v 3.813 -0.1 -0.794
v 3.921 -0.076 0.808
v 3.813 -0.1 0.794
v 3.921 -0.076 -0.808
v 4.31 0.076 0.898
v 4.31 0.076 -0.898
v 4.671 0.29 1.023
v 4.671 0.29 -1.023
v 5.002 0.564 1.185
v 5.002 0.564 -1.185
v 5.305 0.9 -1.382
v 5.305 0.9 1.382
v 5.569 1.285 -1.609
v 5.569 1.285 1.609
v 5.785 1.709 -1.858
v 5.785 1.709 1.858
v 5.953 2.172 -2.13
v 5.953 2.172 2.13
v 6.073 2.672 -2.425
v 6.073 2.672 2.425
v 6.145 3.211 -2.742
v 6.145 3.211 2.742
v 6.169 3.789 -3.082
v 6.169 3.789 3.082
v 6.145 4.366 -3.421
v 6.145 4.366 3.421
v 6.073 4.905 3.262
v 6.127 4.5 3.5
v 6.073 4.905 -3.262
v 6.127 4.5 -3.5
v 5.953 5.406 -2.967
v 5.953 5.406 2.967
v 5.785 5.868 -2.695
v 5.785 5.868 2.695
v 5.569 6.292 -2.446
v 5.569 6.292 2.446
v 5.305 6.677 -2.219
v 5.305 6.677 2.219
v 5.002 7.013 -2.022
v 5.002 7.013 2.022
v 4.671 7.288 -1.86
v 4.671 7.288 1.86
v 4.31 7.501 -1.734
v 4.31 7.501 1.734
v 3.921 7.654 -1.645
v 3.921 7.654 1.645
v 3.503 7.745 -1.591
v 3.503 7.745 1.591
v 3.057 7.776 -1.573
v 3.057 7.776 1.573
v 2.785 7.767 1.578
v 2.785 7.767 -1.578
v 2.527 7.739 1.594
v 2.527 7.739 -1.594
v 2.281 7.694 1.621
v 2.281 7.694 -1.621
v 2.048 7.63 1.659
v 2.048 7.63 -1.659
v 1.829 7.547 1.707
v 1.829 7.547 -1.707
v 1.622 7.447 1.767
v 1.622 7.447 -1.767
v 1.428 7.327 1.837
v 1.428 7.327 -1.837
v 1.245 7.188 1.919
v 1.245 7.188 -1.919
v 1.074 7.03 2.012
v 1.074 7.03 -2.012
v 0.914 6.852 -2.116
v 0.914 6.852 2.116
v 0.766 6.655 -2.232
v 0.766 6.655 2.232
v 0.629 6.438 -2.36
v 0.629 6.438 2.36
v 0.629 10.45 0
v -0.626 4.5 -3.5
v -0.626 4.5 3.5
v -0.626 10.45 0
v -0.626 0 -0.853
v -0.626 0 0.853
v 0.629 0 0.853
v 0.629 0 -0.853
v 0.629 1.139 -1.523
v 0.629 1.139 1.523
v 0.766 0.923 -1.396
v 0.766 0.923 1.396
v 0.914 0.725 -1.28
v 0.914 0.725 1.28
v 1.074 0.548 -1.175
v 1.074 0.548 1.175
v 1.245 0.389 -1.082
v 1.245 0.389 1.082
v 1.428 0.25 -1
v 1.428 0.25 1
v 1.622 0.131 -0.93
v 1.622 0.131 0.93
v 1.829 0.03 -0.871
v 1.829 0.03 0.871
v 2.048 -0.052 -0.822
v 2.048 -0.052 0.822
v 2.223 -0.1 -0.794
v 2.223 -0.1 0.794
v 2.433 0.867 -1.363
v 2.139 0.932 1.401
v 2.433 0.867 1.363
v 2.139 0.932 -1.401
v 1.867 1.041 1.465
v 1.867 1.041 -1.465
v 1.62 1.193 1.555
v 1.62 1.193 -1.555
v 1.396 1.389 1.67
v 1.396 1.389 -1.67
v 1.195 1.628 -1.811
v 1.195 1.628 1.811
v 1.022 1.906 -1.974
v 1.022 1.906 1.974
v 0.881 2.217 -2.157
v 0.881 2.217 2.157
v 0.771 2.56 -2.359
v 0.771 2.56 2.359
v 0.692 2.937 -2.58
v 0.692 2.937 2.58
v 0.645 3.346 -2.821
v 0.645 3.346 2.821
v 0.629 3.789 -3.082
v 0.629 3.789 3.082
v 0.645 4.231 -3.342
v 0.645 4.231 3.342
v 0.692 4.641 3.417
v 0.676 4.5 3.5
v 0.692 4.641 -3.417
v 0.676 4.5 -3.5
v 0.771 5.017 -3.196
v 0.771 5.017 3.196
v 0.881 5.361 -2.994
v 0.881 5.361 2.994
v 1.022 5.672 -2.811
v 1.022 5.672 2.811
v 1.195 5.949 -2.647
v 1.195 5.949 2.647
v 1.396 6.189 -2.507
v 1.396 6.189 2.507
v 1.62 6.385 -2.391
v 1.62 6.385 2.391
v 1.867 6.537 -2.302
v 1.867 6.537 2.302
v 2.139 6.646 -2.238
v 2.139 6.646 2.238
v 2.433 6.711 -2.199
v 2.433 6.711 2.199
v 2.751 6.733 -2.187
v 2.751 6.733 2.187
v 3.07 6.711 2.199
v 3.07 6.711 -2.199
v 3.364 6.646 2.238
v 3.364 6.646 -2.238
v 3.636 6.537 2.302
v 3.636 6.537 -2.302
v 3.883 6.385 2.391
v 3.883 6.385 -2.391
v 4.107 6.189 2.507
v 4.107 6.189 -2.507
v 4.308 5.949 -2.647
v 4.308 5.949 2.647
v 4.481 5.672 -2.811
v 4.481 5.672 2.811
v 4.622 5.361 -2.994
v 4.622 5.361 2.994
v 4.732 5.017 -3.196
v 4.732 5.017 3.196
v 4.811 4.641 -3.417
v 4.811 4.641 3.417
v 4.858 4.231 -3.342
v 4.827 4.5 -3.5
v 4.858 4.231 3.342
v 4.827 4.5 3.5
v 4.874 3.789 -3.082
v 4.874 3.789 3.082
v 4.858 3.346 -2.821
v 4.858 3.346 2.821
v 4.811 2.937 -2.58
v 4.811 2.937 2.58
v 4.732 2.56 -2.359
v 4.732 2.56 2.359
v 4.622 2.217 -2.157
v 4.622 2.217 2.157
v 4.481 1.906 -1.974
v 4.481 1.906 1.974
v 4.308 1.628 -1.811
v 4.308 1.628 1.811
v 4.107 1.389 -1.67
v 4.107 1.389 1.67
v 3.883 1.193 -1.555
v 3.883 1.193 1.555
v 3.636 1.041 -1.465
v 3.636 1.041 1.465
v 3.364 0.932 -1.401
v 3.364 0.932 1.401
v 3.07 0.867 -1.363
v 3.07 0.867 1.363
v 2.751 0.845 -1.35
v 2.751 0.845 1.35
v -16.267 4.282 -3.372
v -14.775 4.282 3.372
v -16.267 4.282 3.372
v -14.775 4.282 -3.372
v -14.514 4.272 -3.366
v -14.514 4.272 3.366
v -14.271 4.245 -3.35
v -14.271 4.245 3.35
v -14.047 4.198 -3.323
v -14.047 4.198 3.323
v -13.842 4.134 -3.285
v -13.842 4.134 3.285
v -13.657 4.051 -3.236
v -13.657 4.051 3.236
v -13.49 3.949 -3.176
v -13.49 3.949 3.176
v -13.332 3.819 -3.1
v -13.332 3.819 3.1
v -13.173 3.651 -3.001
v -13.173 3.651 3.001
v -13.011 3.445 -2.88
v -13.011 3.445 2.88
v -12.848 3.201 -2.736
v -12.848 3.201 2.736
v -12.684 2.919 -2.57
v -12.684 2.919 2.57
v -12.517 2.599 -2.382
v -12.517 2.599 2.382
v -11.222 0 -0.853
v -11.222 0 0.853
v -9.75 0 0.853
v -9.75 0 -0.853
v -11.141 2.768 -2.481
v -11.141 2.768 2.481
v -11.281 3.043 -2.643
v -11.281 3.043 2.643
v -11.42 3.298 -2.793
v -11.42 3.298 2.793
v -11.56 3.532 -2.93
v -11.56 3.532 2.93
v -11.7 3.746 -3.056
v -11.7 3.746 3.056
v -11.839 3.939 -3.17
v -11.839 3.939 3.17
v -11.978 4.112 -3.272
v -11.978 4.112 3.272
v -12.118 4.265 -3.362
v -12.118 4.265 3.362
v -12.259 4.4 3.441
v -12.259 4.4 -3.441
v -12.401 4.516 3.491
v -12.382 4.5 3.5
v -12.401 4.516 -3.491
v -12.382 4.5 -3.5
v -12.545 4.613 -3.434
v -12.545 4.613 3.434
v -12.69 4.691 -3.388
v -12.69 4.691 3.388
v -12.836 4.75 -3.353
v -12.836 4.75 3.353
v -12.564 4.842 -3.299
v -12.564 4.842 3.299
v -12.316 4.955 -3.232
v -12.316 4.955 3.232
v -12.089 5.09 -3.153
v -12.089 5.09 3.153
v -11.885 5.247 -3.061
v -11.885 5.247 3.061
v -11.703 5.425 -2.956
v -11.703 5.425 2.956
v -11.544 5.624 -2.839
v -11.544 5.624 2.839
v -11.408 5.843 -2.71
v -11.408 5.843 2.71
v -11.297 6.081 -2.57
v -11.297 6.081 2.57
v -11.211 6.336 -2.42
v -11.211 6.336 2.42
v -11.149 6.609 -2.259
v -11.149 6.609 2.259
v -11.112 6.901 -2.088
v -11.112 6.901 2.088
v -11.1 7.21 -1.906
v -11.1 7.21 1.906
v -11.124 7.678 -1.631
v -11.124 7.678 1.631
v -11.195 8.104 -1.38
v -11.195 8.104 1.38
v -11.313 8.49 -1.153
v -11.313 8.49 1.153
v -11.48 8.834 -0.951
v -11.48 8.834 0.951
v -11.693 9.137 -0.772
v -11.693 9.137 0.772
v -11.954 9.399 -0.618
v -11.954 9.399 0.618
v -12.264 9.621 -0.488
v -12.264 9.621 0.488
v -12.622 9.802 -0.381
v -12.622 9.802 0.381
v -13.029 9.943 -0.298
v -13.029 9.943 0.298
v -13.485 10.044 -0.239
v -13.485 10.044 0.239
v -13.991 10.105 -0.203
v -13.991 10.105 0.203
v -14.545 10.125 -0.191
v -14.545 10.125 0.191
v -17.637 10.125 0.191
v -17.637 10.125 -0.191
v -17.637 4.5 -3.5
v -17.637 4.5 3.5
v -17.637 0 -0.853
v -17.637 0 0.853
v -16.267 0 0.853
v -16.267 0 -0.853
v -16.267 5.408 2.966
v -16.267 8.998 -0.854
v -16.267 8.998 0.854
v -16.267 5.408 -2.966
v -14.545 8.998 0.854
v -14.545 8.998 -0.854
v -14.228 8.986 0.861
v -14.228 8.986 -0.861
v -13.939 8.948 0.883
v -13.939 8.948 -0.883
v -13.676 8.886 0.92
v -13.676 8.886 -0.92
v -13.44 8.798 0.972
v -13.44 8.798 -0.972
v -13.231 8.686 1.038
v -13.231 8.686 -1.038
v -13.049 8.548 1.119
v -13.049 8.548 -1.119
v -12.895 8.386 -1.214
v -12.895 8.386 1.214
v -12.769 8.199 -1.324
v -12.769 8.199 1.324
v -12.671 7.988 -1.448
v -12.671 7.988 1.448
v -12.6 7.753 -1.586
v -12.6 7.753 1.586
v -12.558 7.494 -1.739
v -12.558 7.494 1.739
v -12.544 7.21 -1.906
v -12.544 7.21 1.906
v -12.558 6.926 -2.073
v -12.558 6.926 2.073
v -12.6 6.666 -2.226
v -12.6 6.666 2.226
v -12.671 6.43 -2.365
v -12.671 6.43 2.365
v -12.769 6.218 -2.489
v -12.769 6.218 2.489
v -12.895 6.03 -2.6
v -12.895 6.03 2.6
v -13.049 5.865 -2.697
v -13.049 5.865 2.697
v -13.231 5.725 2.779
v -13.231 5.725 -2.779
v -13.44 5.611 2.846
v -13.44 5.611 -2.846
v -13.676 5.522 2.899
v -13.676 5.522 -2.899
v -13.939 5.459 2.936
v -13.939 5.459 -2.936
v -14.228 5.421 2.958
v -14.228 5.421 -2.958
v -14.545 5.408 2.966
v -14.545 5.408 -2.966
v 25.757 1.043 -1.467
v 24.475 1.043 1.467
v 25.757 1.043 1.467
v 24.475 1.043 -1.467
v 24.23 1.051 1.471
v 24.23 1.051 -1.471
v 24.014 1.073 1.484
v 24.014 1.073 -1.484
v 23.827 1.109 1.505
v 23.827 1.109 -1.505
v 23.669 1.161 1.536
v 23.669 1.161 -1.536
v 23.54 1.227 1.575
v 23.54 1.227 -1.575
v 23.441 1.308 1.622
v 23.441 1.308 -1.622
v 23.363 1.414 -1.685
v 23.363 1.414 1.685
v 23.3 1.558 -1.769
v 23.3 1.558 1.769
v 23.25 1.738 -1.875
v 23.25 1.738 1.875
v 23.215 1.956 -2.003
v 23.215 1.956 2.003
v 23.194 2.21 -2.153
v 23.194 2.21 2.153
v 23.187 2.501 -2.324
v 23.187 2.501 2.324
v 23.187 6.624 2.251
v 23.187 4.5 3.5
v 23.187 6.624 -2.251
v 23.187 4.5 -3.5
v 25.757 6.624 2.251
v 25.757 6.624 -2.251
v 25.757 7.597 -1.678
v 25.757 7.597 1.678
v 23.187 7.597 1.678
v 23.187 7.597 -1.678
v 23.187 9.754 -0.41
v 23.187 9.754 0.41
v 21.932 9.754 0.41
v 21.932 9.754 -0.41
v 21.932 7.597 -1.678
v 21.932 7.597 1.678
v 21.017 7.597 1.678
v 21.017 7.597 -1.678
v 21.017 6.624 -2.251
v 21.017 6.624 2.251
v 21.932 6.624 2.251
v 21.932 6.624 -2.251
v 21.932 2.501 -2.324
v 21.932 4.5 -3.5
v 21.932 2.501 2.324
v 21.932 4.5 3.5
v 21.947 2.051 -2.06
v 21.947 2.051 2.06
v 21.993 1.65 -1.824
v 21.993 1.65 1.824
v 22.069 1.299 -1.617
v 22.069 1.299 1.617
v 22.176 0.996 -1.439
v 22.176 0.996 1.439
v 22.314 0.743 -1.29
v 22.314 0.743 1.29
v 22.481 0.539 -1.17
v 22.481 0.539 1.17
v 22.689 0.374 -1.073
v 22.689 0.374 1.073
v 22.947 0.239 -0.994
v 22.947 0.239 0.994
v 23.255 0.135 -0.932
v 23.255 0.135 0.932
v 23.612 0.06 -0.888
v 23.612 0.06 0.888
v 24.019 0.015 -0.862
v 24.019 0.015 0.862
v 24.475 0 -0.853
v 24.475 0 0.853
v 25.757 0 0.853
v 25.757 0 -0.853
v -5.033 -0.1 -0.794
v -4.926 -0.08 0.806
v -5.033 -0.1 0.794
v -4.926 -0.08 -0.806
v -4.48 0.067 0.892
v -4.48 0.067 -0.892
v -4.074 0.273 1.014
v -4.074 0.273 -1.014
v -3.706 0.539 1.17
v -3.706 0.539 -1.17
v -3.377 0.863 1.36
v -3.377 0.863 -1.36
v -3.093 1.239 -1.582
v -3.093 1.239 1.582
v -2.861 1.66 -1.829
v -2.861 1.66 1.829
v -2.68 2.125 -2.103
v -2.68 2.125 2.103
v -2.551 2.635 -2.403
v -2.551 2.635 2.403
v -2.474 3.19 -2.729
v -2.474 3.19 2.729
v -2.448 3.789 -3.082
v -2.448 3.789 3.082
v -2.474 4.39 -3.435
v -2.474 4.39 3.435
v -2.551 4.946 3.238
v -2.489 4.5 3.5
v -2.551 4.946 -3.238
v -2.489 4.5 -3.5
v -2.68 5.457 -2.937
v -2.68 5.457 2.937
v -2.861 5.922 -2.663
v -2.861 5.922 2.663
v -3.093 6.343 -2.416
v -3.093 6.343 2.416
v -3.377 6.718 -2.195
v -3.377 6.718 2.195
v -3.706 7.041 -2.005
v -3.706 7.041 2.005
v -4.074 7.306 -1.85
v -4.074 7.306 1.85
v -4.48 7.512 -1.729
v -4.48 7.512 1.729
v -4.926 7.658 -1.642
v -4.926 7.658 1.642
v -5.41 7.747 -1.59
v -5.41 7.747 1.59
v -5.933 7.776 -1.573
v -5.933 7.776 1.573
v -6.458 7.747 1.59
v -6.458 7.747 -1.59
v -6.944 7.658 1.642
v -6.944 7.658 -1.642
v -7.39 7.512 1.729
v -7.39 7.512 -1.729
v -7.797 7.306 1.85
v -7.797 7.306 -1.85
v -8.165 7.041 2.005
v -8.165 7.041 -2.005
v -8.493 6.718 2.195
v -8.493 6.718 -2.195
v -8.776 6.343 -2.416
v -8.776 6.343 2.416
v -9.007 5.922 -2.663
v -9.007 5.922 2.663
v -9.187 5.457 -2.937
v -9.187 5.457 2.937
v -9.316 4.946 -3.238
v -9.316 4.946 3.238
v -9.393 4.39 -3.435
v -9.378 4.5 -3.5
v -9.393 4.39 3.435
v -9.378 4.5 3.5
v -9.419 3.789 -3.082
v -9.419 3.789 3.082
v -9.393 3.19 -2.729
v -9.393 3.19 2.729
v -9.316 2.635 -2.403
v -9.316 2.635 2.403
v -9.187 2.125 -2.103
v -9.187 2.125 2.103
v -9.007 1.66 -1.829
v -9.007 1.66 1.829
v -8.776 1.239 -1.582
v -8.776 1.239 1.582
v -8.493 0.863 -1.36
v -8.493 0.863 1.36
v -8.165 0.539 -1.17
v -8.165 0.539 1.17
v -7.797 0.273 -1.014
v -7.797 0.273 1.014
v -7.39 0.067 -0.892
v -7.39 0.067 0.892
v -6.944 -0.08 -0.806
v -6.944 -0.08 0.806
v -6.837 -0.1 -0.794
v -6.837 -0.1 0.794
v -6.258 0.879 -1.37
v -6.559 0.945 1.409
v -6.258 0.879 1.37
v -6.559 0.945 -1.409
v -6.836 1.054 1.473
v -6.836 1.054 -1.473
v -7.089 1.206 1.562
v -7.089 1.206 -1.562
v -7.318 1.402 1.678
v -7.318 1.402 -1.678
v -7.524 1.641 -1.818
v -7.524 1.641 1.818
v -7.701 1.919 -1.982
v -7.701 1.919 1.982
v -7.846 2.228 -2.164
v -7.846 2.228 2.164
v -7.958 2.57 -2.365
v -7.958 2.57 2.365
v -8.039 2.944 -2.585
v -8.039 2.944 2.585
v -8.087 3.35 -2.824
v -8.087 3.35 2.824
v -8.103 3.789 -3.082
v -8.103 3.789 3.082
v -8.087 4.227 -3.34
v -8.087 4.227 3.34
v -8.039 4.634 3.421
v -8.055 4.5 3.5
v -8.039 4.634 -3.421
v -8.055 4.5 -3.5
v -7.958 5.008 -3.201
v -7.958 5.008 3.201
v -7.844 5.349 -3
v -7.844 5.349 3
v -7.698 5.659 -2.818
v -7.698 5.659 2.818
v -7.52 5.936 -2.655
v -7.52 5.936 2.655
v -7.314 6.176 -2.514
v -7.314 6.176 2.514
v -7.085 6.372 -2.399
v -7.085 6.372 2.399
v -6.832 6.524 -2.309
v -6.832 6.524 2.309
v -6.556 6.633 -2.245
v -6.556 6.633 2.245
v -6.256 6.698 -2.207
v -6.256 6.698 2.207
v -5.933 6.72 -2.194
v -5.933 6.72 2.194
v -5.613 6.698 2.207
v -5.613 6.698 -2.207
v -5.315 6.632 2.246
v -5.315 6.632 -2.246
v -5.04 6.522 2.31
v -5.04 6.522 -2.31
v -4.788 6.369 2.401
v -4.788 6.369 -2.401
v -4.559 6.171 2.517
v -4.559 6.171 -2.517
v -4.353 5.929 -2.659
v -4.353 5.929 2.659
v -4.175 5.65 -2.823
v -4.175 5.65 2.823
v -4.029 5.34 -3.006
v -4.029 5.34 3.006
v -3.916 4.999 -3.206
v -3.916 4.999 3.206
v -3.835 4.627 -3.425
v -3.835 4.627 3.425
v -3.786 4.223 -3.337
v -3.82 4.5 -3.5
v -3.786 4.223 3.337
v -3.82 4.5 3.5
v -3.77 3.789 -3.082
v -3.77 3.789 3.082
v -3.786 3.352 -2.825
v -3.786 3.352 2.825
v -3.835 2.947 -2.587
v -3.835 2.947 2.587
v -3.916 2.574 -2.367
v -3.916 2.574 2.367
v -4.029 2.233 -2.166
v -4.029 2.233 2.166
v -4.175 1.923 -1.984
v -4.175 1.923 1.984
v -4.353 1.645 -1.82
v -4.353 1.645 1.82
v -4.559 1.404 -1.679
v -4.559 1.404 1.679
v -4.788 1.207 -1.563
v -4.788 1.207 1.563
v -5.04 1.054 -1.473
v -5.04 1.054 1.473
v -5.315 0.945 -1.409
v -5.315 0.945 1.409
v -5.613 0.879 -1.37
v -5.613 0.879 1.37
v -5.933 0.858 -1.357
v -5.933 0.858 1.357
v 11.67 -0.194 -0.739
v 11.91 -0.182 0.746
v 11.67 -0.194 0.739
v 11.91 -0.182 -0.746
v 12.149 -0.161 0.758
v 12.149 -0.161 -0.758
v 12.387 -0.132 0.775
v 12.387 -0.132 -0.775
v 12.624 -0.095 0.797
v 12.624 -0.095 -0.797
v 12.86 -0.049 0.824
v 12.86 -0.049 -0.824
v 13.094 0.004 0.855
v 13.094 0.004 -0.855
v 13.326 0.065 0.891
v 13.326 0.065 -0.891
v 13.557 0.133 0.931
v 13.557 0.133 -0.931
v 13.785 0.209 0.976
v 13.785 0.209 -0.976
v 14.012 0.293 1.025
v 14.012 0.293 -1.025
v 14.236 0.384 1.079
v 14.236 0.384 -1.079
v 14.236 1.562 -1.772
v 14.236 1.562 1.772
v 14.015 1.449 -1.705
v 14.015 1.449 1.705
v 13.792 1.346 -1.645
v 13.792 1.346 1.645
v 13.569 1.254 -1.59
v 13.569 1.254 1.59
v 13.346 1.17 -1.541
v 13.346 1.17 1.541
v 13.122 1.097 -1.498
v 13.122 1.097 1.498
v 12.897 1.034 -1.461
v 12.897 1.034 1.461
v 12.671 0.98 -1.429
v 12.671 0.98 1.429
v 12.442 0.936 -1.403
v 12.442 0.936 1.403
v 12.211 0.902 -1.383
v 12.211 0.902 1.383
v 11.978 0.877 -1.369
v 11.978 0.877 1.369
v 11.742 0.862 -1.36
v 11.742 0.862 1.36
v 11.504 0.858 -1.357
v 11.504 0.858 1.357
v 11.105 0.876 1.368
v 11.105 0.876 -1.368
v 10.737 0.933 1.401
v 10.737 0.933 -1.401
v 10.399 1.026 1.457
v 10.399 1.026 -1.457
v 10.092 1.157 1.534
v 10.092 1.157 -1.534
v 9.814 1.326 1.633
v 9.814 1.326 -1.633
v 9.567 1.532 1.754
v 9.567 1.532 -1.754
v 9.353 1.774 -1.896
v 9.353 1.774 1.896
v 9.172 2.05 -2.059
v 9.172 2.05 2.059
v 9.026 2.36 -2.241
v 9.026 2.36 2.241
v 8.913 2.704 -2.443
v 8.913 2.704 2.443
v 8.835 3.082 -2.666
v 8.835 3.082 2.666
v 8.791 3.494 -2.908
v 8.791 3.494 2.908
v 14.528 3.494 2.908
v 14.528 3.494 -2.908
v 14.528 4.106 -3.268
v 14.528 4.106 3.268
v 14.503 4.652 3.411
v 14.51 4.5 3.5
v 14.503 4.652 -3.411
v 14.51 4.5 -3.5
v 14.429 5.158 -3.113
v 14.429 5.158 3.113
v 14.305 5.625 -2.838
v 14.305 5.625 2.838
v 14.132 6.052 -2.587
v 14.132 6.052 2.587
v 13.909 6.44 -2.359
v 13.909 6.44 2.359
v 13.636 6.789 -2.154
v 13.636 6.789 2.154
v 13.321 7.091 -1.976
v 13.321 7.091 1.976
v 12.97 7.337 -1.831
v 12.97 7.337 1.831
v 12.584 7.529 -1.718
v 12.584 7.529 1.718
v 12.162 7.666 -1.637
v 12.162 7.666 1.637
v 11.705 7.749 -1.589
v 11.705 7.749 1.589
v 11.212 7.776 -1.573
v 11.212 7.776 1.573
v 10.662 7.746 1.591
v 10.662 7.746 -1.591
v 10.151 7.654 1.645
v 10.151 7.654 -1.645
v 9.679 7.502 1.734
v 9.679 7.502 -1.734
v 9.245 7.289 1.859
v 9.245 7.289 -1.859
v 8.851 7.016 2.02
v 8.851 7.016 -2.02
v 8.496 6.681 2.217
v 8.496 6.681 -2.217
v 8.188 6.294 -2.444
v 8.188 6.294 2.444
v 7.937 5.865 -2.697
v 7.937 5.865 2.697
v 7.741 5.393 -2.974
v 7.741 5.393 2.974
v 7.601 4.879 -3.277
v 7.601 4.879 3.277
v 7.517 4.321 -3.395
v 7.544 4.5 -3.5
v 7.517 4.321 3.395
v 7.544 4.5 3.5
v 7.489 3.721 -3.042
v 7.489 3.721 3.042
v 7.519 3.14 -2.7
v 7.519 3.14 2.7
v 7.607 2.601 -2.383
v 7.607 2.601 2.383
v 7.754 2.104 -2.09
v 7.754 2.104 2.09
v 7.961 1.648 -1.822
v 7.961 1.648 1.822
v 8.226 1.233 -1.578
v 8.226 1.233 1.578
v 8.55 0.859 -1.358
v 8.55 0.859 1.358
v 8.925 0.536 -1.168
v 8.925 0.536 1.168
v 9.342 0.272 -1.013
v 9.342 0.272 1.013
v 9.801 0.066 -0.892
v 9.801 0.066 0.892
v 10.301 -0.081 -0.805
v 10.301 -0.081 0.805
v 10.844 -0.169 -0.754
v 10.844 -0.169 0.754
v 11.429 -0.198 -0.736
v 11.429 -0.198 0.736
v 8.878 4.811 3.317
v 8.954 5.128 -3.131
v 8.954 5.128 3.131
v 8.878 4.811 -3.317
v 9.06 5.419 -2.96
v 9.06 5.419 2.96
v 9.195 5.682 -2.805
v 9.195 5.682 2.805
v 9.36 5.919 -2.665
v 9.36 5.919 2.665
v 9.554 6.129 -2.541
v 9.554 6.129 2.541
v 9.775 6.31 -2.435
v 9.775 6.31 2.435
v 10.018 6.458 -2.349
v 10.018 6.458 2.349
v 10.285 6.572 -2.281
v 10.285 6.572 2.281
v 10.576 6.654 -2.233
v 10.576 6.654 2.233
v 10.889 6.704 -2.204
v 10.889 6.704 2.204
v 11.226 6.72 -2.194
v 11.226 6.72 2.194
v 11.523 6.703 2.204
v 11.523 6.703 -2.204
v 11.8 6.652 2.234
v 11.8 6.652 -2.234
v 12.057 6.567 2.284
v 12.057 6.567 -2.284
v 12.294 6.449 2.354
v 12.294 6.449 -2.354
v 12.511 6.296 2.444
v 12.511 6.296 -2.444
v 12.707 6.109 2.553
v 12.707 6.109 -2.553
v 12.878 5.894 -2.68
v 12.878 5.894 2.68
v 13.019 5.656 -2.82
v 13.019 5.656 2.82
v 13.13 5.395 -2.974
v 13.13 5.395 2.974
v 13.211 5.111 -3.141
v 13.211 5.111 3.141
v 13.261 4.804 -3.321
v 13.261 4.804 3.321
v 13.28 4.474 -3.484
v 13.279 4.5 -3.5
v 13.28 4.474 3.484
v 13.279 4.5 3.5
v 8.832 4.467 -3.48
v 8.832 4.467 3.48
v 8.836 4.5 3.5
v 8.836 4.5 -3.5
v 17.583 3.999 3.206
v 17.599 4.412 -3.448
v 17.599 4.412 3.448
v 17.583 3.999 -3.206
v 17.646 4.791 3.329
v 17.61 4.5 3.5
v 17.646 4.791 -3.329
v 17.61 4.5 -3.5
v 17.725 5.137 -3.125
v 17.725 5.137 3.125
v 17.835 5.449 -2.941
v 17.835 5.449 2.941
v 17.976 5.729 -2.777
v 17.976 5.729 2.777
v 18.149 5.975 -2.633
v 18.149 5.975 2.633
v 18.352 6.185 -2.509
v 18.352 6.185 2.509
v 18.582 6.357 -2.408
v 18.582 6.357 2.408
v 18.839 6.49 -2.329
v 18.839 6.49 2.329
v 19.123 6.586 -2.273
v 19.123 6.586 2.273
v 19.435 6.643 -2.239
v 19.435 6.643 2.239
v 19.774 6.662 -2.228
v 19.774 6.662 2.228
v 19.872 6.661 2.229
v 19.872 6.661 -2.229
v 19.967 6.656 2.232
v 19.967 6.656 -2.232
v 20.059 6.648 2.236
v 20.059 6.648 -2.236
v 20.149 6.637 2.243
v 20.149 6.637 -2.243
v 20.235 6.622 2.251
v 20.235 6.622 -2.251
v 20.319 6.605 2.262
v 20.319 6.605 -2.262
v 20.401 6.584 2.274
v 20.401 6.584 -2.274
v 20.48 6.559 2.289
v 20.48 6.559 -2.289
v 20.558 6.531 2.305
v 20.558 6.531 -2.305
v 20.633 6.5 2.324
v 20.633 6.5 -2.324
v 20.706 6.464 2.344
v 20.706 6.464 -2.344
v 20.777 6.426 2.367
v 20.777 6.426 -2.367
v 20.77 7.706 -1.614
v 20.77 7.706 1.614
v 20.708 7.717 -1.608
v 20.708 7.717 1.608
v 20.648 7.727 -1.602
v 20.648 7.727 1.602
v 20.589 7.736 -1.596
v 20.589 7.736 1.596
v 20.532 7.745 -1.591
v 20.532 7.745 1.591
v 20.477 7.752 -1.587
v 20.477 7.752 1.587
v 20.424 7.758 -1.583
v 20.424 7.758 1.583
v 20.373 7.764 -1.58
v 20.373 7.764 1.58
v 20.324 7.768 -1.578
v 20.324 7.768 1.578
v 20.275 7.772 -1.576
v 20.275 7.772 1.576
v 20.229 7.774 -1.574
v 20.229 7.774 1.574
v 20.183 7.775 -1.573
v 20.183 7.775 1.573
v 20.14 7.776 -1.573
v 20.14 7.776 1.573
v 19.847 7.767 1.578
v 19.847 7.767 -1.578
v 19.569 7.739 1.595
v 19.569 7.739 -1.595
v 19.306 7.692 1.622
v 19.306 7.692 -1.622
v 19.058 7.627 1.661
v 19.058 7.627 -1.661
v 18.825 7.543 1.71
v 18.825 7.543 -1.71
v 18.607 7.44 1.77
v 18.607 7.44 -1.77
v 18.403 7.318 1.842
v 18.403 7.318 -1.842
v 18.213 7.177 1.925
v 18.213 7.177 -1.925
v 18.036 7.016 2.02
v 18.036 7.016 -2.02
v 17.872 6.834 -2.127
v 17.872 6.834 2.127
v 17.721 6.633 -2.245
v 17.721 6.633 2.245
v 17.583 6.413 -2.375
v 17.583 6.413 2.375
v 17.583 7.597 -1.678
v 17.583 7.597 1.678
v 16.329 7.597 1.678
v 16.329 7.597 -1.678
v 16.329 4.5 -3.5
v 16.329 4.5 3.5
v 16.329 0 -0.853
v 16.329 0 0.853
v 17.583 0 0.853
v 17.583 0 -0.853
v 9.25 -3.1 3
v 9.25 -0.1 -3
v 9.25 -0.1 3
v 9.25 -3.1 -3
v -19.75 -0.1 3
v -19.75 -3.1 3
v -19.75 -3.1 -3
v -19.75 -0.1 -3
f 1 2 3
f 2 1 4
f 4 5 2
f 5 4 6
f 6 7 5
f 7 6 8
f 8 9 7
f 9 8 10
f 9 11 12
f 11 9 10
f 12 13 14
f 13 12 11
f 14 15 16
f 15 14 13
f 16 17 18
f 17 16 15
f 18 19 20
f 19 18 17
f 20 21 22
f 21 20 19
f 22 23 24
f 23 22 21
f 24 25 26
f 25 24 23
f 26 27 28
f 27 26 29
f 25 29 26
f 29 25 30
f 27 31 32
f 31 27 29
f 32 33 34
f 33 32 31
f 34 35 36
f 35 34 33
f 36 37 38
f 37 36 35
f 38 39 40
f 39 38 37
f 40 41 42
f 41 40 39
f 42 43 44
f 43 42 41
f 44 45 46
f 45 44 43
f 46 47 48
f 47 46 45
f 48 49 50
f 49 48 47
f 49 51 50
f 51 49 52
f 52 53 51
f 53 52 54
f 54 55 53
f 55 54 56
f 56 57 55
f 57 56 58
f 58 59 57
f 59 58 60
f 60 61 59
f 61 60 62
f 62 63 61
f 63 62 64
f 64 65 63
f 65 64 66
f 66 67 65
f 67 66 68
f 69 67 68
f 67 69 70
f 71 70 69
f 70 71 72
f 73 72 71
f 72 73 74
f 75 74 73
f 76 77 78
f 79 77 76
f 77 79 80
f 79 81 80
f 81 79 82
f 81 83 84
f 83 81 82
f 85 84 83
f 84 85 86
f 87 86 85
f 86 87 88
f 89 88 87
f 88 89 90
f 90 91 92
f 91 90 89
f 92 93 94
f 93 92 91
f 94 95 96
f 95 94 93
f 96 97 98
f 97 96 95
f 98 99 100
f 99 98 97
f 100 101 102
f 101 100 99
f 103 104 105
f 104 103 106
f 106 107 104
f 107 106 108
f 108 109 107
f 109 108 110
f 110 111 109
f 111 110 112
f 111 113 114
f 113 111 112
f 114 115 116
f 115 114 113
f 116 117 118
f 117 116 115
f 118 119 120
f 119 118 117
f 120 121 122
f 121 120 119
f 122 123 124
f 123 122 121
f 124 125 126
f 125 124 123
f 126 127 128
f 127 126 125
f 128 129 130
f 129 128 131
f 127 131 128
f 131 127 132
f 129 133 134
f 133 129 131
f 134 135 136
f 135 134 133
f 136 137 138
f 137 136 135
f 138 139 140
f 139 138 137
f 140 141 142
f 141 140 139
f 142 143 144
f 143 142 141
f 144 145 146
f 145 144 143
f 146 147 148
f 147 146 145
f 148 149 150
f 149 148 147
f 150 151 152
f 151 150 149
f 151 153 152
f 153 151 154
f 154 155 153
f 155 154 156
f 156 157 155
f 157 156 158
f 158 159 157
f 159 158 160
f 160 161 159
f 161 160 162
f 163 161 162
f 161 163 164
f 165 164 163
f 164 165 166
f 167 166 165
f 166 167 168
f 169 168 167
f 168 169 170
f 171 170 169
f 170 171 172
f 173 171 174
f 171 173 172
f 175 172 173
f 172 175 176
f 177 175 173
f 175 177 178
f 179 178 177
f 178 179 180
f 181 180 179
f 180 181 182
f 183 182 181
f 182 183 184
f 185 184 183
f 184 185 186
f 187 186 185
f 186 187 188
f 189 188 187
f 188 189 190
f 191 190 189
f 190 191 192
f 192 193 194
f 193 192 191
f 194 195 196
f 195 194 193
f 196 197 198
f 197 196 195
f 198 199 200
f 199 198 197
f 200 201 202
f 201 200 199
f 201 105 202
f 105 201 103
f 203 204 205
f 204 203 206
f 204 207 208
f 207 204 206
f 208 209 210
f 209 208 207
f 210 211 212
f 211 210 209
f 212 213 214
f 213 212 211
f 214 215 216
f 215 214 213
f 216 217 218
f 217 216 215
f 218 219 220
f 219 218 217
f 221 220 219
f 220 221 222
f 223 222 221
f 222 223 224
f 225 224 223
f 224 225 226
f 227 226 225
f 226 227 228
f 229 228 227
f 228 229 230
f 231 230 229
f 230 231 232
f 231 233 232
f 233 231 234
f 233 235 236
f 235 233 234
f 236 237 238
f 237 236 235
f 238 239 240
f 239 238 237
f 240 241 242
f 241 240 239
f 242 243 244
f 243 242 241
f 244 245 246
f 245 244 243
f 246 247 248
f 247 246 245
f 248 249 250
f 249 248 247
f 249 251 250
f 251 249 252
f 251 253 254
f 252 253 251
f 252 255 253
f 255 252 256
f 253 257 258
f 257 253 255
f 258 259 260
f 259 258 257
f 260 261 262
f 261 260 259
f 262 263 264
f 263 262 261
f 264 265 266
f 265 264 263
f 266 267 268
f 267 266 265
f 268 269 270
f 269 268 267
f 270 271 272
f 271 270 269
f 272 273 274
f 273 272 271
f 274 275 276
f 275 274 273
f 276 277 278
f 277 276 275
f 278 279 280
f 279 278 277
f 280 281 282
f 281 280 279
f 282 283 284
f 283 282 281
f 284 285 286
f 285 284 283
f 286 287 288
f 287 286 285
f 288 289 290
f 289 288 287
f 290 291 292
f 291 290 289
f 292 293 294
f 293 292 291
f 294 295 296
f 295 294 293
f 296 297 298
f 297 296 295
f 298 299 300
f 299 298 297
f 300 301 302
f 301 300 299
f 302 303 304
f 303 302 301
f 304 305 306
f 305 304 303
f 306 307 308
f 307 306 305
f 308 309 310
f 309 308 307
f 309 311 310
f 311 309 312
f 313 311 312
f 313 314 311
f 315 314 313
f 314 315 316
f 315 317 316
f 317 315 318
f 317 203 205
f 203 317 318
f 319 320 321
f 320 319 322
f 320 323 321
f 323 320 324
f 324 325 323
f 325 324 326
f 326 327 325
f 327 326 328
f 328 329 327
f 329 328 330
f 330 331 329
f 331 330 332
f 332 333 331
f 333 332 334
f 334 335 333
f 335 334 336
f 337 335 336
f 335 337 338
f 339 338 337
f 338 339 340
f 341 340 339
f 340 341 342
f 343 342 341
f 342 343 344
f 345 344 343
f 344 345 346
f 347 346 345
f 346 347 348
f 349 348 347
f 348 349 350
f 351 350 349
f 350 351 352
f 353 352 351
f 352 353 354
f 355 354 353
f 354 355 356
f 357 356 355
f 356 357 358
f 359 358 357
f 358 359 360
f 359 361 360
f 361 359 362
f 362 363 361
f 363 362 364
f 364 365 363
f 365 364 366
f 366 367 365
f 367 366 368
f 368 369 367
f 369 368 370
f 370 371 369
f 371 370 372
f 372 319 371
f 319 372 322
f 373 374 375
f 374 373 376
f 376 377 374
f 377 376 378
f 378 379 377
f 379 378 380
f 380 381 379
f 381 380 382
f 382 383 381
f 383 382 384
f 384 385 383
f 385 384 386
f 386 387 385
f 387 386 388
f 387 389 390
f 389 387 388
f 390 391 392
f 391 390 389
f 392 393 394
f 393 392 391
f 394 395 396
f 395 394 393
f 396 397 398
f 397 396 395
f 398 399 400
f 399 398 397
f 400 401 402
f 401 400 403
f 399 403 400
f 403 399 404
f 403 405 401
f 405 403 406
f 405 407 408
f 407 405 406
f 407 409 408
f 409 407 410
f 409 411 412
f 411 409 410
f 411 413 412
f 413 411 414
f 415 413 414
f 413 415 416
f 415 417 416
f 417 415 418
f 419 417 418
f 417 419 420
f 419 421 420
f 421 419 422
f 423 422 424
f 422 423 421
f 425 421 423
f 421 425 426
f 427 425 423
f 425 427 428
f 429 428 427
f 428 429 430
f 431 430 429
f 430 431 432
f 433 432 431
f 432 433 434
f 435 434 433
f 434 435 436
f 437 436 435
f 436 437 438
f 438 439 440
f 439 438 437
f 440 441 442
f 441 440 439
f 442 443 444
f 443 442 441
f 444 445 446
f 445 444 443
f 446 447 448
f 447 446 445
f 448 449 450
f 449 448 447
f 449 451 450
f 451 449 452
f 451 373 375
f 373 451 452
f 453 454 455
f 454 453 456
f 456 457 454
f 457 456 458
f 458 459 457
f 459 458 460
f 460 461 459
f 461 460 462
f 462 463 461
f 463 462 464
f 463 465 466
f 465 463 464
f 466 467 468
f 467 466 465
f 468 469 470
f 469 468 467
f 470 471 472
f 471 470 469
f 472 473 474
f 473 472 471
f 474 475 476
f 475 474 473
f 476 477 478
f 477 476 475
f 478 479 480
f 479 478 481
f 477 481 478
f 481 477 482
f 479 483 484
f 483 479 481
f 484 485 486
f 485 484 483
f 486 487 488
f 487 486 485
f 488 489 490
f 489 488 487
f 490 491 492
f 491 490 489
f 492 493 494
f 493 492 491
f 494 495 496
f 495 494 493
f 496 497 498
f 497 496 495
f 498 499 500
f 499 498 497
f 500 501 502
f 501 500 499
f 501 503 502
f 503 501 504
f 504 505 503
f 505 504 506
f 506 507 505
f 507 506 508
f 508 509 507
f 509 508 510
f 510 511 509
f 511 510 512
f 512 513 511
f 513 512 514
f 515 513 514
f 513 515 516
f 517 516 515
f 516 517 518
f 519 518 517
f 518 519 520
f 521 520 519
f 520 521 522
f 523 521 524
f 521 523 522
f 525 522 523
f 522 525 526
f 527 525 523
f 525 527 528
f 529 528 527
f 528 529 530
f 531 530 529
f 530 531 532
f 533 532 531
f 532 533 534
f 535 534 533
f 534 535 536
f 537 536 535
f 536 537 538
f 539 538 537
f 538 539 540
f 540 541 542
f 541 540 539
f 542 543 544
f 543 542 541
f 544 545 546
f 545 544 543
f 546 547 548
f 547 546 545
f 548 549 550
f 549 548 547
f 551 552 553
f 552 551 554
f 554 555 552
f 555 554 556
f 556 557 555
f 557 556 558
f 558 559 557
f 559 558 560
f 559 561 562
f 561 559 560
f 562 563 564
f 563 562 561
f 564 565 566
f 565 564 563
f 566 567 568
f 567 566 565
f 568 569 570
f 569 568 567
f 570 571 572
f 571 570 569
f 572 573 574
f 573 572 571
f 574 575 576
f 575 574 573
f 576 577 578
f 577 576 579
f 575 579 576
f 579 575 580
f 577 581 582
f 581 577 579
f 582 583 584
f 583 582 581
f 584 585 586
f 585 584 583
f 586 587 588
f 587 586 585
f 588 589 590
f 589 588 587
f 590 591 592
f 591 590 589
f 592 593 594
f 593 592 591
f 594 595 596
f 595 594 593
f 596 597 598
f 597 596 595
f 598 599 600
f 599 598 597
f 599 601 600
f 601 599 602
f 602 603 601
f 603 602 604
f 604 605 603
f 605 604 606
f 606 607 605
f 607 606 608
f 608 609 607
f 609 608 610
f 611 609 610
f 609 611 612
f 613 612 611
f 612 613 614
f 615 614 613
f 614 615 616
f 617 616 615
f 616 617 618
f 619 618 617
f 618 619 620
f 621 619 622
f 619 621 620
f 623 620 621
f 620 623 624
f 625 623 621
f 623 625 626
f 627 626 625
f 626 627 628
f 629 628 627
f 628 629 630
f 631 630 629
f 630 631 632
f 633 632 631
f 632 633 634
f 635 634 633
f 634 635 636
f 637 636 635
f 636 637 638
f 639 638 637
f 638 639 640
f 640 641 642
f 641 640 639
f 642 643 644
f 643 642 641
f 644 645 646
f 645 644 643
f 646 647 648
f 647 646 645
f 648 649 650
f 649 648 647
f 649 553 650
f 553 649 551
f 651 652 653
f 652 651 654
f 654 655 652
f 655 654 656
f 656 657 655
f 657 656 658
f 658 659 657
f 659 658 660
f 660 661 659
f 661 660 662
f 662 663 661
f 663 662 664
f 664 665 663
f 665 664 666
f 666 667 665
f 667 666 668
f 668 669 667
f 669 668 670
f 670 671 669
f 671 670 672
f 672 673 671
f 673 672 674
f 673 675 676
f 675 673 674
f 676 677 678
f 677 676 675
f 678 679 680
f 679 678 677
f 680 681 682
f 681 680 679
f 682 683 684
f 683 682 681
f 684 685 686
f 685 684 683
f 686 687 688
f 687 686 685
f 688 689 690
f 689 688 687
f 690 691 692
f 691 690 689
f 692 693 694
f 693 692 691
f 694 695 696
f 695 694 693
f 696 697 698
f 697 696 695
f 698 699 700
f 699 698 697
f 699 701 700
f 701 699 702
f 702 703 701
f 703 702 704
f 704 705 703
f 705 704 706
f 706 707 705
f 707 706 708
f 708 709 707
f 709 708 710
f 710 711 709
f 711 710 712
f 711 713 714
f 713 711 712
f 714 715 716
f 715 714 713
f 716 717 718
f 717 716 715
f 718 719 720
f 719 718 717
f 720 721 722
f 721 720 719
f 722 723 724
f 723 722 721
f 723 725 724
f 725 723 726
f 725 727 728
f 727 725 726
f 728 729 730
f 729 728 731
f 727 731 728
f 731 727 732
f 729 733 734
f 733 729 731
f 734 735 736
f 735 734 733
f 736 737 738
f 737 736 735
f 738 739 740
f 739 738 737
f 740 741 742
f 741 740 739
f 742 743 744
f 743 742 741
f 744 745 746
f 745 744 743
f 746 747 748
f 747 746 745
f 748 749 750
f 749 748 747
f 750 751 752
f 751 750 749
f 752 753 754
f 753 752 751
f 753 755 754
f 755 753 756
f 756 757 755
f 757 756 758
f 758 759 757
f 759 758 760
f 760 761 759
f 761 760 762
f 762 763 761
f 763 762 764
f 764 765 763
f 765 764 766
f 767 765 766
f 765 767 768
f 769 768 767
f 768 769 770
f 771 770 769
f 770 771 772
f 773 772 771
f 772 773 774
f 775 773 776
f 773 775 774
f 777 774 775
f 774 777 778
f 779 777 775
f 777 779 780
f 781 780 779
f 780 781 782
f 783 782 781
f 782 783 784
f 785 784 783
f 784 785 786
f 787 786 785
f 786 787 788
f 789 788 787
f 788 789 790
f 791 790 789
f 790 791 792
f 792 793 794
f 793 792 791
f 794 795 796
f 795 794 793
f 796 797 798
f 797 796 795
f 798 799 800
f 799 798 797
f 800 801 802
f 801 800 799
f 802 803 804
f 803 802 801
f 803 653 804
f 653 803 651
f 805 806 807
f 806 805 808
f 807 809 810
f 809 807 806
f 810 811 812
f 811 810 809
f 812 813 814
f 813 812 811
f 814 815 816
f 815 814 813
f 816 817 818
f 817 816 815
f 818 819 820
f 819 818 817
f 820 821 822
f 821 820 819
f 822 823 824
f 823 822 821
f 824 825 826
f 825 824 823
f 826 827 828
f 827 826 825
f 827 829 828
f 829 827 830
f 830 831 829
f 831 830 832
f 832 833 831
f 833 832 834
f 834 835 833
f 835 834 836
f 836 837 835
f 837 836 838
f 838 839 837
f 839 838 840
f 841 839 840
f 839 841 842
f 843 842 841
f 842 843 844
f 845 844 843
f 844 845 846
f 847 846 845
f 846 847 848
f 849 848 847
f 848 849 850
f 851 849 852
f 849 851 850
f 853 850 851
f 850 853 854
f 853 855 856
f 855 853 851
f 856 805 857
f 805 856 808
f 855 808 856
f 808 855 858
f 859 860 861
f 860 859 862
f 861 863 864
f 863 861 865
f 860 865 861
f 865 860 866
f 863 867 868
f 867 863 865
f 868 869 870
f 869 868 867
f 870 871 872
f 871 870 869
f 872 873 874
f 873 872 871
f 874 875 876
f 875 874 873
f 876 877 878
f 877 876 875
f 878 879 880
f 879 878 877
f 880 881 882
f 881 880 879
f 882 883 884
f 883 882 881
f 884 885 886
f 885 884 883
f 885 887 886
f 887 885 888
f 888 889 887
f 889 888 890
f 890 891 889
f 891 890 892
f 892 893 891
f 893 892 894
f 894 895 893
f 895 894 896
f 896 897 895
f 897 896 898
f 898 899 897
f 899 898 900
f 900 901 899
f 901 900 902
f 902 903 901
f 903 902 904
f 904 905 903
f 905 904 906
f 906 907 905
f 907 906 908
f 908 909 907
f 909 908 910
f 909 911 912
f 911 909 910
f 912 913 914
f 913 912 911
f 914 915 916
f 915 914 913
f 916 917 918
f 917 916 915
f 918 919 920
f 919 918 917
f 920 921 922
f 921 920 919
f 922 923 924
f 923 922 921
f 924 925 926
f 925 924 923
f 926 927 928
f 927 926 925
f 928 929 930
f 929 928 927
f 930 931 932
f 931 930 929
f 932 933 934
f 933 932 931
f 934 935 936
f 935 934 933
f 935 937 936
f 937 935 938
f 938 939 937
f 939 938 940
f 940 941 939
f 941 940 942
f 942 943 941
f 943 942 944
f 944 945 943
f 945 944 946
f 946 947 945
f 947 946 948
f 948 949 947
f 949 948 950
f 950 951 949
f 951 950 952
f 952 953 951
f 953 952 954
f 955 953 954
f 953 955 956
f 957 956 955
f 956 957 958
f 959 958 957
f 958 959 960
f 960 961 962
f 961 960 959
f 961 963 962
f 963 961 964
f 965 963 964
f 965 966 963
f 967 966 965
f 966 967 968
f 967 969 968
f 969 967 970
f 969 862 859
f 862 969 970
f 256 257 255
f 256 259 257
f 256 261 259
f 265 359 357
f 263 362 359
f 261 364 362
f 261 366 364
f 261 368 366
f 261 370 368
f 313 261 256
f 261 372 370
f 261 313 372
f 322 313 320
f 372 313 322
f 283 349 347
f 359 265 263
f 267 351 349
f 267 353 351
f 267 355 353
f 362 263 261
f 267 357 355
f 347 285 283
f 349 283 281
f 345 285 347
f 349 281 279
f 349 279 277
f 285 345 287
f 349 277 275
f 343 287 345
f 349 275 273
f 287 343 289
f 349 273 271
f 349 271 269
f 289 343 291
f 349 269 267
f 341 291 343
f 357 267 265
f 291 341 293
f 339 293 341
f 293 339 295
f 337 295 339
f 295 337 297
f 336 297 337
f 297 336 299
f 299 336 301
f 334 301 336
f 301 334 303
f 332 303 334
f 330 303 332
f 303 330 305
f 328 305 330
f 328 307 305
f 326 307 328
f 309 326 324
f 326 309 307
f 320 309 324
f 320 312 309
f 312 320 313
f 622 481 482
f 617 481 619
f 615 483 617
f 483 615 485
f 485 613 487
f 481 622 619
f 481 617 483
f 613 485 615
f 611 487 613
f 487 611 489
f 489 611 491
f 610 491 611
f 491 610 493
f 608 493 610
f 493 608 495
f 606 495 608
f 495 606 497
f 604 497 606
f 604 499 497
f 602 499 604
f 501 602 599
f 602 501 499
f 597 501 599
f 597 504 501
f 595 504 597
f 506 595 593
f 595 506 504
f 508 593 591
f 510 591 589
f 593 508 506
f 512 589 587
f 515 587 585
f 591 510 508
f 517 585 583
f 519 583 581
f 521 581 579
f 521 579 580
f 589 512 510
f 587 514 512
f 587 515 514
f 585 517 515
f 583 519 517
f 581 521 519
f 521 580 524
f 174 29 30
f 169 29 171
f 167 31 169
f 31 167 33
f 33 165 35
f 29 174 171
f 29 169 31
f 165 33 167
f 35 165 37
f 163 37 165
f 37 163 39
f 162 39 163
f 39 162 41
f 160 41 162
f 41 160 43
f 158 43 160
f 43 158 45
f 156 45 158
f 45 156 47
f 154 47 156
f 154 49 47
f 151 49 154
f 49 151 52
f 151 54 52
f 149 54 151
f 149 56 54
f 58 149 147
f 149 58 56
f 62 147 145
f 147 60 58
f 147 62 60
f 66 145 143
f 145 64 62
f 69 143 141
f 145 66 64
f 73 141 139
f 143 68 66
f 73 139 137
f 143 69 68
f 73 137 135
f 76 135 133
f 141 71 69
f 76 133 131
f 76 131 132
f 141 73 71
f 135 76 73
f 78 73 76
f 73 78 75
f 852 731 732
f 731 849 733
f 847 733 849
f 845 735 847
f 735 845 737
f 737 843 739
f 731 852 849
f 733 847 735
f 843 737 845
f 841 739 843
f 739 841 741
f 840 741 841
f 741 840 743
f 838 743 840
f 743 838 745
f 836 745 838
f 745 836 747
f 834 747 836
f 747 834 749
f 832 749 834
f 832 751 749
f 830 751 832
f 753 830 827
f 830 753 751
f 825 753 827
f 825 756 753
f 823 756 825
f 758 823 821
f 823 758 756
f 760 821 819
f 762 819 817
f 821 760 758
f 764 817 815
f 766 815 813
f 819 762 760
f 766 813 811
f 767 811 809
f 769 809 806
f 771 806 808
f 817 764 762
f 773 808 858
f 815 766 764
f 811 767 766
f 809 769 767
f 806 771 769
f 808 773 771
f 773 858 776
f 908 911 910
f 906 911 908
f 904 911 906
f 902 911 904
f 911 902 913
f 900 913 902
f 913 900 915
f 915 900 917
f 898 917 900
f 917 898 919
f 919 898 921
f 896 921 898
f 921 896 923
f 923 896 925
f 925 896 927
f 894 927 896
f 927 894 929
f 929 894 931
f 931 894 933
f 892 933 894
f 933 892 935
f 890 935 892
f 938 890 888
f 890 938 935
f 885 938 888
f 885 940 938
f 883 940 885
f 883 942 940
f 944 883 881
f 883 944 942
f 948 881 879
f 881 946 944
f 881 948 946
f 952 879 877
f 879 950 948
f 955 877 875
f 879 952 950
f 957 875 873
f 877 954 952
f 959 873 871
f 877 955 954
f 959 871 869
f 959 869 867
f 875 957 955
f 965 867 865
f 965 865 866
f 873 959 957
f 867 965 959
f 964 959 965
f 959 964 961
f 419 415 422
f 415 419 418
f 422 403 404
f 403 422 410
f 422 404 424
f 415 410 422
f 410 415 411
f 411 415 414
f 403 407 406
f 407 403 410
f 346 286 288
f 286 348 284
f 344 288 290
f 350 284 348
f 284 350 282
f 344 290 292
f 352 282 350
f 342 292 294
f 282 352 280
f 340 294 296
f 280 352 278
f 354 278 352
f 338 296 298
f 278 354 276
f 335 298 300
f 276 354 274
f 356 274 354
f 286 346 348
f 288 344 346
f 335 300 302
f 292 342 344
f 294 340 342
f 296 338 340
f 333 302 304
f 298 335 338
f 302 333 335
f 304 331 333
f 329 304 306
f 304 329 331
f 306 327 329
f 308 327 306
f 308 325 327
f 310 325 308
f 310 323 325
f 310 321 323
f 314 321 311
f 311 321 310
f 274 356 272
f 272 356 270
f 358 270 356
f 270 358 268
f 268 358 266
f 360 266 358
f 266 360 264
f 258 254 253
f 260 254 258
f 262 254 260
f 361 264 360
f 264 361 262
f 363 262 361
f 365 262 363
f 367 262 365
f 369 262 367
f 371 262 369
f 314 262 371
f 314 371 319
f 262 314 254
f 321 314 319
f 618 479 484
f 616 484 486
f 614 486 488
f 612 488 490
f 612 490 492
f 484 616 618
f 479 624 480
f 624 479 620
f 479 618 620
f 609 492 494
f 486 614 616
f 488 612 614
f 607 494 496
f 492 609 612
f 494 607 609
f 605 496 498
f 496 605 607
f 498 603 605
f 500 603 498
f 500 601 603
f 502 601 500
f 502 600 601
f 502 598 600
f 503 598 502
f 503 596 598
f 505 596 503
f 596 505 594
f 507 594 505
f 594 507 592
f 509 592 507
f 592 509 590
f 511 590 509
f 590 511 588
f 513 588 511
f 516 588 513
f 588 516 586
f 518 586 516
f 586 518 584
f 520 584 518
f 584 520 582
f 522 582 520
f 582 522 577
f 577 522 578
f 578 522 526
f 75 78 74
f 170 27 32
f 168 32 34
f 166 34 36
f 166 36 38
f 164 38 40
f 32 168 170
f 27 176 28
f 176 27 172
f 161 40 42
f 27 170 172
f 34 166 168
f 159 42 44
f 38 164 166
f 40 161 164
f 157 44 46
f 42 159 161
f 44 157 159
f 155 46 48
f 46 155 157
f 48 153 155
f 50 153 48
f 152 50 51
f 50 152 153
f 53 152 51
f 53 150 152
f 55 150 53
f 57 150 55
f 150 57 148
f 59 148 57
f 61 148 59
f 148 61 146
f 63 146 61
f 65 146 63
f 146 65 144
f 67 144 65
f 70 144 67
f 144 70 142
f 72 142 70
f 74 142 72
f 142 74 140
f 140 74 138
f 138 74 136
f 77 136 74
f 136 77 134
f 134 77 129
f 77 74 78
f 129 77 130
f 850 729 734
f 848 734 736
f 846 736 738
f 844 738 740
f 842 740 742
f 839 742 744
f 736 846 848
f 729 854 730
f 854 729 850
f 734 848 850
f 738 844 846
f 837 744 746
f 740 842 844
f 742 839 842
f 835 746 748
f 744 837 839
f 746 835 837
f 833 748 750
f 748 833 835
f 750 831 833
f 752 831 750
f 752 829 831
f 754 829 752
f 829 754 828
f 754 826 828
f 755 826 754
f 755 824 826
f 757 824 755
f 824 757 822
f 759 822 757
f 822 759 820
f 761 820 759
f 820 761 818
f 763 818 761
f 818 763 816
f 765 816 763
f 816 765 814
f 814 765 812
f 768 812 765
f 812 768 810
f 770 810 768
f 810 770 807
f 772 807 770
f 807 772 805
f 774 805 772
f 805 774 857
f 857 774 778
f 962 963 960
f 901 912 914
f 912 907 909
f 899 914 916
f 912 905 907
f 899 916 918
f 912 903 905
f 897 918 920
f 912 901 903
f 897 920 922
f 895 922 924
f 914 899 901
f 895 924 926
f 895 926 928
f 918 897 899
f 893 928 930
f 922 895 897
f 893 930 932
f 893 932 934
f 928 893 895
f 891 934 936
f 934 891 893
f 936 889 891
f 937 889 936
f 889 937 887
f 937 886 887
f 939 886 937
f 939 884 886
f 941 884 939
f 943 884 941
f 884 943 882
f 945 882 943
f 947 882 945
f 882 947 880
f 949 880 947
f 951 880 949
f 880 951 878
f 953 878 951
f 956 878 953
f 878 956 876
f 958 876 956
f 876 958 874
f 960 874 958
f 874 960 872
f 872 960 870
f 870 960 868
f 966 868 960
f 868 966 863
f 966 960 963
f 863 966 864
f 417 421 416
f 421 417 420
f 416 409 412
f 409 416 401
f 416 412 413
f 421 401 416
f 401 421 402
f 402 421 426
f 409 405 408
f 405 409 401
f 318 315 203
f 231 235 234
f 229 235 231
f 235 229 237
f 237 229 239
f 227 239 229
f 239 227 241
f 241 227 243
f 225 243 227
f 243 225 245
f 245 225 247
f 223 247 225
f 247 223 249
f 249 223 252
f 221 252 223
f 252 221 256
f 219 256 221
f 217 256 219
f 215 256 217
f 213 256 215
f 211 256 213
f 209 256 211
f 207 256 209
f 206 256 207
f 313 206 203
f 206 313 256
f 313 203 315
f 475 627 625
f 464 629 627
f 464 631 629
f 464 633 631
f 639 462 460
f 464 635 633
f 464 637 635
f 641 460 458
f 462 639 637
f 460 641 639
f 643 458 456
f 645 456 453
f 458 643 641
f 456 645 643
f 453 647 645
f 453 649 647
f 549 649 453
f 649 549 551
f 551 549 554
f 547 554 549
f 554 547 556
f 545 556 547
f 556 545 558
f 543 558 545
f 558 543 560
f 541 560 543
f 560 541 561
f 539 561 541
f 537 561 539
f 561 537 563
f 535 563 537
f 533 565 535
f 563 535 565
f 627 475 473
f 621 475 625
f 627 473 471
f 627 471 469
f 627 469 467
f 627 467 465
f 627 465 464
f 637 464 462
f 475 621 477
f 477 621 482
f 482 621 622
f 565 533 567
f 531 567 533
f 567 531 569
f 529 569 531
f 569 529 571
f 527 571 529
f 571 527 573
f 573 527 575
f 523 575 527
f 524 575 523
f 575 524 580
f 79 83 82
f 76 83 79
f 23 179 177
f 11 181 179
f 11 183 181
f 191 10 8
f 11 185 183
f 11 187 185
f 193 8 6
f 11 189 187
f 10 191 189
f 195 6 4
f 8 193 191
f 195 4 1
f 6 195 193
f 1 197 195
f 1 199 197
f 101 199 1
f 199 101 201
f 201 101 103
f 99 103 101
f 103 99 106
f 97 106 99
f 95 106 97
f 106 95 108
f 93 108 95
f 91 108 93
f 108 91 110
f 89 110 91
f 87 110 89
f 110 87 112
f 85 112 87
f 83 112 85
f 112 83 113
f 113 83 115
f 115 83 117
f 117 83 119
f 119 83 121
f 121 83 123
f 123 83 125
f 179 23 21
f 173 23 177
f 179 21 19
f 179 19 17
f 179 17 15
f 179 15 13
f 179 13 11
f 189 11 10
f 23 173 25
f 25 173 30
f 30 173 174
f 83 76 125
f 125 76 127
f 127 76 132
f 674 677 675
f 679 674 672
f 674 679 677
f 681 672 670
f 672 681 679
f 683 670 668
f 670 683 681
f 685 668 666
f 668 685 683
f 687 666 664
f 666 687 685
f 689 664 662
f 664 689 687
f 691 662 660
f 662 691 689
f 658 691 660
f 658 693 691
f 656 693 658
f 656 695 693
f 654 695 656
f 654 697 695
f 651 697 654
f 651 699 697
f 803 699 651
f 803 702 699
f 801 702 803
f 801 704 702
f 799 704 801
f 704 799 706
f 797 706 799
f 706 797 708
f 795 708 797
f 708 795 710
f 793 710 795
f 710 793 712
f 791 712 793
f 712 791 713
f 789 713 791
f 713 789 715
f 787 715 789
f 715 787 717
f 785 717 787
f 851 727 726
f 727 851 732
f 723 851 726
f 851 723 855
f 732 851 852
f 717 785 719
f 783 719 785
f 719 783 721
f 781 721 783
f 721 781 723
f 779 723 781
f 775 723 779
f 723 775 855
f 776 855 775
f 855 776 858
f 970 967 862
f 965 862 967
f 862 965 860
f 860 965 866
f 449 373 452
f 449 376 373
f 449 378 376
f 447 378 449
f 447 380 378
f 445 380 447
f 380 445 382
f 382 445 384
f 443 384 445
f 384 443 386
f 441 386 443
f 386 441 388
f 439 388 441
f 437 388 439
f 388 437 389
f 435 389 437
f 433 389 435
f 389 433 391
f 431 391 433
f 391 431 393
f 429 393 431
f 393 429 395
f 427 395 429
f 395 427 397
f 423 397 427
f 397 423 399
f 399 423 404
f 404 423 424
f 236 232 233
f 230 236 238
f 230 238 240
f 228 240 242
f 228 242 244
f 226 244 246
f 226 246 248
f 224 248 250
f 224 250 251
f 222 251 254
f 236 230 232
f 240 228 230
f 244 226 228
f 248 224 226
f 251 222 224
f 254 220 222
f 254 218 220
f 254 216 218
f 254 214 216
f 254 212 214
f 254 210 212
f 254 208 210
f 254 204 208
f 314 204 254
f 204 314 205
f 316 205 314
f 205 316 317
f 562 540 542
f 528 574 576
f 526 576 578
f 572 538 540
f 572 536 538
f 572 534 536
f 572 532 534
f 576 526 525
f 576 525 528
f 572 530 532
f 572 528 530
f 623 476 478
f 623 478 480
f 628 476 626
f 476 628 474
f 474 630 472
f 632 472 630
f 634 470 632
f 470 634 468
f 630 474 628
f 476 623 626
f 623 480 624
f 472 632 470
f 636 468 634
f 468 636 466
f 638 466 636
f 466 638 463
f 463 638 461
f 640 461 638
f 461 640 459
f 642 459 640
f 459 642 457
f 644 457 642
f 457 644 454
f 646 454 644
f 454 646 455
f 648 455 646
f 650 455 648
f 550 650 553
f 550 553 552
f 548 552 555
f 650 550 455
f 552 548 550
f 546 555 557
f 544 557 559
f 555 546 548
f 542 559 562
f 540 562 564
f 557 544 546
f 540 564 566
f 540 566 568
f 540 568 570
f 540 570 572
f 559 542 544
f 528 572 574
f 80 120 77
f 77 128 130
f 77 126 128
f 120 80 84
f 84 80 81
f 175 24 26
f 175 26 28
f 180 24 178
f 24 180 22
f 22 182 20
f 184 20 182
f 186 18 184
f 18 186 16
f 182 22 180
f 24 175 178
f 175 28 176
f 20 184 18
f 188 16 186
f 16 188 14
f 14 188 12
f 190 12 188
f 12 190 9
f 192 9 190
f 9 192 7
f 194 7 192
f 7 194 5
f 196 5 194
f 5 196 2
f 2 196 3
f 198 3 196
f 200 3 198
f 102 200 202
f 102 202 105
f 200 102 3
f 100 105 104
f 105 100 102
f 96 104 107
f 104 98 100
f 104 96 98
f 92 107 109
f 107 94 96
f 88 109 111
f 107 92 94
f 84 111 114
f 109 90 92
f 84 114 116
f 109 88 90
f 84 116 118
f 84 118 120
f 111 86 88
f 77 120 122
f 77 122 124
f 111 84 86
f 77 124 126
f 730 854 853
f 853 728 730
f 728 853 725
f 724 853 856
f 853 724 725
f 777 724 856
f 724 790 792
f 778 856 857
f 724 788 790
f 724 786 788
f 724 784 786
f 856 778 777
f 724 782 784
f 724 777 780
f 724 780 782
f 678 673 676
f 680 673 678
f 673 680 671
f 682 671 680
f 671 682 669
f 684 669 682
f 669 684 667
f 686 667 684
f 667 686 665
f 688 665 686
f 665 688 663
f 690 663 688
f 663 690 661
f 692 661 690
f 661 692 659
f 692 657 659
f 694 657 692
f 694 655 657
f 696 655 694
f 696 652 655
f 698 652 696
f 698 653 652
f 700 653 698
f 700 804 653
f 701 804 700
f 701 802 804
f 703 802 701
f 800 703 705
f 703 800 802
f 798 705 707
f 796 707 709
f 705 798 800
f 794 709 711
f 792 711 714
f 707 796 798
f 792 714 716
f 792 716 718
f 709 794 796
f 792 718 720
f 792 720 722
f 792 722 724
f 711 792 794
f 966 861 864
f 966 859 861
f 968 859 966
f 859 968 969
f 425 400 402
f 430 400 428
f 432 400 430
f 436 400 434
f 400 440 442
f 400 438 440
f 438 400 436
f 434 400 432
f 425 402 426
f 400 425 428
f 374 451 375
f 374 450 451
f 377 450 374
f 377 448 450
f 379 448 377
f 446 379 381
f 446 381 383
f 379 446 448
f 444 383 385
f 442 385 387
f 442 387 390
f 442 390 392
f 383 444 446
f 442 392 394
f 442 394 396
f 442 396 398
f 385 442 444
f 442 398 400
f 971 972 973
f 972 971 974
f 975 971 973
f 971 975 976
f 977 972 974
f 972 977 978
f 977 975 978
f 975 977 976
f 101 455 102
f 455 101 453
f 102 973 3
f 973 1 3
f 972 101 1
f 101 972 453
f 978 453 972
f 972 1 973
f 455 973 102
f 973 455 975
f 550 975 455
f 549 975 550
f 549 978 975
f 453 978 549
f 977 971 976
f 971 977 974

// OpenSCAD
$fn=40;
rotate(a=360*$t,v=[0,1,0]) translate([-19,0,-5])
color("lightblue")
render(convexity=3) {
    union() {
        intersection() {
            linear_extrude(10) text("Robert", font="SignPainter:style=HouseScript",size=10);
            translate([-3,4.5,5]) scale([1,1.7,1]) rotate([0,90,0]) cylinder($fn=4,r=3.5,h=50);
        }
        translate([-.75,-3.1,2]) cube([29,3,6]);
    }
}
